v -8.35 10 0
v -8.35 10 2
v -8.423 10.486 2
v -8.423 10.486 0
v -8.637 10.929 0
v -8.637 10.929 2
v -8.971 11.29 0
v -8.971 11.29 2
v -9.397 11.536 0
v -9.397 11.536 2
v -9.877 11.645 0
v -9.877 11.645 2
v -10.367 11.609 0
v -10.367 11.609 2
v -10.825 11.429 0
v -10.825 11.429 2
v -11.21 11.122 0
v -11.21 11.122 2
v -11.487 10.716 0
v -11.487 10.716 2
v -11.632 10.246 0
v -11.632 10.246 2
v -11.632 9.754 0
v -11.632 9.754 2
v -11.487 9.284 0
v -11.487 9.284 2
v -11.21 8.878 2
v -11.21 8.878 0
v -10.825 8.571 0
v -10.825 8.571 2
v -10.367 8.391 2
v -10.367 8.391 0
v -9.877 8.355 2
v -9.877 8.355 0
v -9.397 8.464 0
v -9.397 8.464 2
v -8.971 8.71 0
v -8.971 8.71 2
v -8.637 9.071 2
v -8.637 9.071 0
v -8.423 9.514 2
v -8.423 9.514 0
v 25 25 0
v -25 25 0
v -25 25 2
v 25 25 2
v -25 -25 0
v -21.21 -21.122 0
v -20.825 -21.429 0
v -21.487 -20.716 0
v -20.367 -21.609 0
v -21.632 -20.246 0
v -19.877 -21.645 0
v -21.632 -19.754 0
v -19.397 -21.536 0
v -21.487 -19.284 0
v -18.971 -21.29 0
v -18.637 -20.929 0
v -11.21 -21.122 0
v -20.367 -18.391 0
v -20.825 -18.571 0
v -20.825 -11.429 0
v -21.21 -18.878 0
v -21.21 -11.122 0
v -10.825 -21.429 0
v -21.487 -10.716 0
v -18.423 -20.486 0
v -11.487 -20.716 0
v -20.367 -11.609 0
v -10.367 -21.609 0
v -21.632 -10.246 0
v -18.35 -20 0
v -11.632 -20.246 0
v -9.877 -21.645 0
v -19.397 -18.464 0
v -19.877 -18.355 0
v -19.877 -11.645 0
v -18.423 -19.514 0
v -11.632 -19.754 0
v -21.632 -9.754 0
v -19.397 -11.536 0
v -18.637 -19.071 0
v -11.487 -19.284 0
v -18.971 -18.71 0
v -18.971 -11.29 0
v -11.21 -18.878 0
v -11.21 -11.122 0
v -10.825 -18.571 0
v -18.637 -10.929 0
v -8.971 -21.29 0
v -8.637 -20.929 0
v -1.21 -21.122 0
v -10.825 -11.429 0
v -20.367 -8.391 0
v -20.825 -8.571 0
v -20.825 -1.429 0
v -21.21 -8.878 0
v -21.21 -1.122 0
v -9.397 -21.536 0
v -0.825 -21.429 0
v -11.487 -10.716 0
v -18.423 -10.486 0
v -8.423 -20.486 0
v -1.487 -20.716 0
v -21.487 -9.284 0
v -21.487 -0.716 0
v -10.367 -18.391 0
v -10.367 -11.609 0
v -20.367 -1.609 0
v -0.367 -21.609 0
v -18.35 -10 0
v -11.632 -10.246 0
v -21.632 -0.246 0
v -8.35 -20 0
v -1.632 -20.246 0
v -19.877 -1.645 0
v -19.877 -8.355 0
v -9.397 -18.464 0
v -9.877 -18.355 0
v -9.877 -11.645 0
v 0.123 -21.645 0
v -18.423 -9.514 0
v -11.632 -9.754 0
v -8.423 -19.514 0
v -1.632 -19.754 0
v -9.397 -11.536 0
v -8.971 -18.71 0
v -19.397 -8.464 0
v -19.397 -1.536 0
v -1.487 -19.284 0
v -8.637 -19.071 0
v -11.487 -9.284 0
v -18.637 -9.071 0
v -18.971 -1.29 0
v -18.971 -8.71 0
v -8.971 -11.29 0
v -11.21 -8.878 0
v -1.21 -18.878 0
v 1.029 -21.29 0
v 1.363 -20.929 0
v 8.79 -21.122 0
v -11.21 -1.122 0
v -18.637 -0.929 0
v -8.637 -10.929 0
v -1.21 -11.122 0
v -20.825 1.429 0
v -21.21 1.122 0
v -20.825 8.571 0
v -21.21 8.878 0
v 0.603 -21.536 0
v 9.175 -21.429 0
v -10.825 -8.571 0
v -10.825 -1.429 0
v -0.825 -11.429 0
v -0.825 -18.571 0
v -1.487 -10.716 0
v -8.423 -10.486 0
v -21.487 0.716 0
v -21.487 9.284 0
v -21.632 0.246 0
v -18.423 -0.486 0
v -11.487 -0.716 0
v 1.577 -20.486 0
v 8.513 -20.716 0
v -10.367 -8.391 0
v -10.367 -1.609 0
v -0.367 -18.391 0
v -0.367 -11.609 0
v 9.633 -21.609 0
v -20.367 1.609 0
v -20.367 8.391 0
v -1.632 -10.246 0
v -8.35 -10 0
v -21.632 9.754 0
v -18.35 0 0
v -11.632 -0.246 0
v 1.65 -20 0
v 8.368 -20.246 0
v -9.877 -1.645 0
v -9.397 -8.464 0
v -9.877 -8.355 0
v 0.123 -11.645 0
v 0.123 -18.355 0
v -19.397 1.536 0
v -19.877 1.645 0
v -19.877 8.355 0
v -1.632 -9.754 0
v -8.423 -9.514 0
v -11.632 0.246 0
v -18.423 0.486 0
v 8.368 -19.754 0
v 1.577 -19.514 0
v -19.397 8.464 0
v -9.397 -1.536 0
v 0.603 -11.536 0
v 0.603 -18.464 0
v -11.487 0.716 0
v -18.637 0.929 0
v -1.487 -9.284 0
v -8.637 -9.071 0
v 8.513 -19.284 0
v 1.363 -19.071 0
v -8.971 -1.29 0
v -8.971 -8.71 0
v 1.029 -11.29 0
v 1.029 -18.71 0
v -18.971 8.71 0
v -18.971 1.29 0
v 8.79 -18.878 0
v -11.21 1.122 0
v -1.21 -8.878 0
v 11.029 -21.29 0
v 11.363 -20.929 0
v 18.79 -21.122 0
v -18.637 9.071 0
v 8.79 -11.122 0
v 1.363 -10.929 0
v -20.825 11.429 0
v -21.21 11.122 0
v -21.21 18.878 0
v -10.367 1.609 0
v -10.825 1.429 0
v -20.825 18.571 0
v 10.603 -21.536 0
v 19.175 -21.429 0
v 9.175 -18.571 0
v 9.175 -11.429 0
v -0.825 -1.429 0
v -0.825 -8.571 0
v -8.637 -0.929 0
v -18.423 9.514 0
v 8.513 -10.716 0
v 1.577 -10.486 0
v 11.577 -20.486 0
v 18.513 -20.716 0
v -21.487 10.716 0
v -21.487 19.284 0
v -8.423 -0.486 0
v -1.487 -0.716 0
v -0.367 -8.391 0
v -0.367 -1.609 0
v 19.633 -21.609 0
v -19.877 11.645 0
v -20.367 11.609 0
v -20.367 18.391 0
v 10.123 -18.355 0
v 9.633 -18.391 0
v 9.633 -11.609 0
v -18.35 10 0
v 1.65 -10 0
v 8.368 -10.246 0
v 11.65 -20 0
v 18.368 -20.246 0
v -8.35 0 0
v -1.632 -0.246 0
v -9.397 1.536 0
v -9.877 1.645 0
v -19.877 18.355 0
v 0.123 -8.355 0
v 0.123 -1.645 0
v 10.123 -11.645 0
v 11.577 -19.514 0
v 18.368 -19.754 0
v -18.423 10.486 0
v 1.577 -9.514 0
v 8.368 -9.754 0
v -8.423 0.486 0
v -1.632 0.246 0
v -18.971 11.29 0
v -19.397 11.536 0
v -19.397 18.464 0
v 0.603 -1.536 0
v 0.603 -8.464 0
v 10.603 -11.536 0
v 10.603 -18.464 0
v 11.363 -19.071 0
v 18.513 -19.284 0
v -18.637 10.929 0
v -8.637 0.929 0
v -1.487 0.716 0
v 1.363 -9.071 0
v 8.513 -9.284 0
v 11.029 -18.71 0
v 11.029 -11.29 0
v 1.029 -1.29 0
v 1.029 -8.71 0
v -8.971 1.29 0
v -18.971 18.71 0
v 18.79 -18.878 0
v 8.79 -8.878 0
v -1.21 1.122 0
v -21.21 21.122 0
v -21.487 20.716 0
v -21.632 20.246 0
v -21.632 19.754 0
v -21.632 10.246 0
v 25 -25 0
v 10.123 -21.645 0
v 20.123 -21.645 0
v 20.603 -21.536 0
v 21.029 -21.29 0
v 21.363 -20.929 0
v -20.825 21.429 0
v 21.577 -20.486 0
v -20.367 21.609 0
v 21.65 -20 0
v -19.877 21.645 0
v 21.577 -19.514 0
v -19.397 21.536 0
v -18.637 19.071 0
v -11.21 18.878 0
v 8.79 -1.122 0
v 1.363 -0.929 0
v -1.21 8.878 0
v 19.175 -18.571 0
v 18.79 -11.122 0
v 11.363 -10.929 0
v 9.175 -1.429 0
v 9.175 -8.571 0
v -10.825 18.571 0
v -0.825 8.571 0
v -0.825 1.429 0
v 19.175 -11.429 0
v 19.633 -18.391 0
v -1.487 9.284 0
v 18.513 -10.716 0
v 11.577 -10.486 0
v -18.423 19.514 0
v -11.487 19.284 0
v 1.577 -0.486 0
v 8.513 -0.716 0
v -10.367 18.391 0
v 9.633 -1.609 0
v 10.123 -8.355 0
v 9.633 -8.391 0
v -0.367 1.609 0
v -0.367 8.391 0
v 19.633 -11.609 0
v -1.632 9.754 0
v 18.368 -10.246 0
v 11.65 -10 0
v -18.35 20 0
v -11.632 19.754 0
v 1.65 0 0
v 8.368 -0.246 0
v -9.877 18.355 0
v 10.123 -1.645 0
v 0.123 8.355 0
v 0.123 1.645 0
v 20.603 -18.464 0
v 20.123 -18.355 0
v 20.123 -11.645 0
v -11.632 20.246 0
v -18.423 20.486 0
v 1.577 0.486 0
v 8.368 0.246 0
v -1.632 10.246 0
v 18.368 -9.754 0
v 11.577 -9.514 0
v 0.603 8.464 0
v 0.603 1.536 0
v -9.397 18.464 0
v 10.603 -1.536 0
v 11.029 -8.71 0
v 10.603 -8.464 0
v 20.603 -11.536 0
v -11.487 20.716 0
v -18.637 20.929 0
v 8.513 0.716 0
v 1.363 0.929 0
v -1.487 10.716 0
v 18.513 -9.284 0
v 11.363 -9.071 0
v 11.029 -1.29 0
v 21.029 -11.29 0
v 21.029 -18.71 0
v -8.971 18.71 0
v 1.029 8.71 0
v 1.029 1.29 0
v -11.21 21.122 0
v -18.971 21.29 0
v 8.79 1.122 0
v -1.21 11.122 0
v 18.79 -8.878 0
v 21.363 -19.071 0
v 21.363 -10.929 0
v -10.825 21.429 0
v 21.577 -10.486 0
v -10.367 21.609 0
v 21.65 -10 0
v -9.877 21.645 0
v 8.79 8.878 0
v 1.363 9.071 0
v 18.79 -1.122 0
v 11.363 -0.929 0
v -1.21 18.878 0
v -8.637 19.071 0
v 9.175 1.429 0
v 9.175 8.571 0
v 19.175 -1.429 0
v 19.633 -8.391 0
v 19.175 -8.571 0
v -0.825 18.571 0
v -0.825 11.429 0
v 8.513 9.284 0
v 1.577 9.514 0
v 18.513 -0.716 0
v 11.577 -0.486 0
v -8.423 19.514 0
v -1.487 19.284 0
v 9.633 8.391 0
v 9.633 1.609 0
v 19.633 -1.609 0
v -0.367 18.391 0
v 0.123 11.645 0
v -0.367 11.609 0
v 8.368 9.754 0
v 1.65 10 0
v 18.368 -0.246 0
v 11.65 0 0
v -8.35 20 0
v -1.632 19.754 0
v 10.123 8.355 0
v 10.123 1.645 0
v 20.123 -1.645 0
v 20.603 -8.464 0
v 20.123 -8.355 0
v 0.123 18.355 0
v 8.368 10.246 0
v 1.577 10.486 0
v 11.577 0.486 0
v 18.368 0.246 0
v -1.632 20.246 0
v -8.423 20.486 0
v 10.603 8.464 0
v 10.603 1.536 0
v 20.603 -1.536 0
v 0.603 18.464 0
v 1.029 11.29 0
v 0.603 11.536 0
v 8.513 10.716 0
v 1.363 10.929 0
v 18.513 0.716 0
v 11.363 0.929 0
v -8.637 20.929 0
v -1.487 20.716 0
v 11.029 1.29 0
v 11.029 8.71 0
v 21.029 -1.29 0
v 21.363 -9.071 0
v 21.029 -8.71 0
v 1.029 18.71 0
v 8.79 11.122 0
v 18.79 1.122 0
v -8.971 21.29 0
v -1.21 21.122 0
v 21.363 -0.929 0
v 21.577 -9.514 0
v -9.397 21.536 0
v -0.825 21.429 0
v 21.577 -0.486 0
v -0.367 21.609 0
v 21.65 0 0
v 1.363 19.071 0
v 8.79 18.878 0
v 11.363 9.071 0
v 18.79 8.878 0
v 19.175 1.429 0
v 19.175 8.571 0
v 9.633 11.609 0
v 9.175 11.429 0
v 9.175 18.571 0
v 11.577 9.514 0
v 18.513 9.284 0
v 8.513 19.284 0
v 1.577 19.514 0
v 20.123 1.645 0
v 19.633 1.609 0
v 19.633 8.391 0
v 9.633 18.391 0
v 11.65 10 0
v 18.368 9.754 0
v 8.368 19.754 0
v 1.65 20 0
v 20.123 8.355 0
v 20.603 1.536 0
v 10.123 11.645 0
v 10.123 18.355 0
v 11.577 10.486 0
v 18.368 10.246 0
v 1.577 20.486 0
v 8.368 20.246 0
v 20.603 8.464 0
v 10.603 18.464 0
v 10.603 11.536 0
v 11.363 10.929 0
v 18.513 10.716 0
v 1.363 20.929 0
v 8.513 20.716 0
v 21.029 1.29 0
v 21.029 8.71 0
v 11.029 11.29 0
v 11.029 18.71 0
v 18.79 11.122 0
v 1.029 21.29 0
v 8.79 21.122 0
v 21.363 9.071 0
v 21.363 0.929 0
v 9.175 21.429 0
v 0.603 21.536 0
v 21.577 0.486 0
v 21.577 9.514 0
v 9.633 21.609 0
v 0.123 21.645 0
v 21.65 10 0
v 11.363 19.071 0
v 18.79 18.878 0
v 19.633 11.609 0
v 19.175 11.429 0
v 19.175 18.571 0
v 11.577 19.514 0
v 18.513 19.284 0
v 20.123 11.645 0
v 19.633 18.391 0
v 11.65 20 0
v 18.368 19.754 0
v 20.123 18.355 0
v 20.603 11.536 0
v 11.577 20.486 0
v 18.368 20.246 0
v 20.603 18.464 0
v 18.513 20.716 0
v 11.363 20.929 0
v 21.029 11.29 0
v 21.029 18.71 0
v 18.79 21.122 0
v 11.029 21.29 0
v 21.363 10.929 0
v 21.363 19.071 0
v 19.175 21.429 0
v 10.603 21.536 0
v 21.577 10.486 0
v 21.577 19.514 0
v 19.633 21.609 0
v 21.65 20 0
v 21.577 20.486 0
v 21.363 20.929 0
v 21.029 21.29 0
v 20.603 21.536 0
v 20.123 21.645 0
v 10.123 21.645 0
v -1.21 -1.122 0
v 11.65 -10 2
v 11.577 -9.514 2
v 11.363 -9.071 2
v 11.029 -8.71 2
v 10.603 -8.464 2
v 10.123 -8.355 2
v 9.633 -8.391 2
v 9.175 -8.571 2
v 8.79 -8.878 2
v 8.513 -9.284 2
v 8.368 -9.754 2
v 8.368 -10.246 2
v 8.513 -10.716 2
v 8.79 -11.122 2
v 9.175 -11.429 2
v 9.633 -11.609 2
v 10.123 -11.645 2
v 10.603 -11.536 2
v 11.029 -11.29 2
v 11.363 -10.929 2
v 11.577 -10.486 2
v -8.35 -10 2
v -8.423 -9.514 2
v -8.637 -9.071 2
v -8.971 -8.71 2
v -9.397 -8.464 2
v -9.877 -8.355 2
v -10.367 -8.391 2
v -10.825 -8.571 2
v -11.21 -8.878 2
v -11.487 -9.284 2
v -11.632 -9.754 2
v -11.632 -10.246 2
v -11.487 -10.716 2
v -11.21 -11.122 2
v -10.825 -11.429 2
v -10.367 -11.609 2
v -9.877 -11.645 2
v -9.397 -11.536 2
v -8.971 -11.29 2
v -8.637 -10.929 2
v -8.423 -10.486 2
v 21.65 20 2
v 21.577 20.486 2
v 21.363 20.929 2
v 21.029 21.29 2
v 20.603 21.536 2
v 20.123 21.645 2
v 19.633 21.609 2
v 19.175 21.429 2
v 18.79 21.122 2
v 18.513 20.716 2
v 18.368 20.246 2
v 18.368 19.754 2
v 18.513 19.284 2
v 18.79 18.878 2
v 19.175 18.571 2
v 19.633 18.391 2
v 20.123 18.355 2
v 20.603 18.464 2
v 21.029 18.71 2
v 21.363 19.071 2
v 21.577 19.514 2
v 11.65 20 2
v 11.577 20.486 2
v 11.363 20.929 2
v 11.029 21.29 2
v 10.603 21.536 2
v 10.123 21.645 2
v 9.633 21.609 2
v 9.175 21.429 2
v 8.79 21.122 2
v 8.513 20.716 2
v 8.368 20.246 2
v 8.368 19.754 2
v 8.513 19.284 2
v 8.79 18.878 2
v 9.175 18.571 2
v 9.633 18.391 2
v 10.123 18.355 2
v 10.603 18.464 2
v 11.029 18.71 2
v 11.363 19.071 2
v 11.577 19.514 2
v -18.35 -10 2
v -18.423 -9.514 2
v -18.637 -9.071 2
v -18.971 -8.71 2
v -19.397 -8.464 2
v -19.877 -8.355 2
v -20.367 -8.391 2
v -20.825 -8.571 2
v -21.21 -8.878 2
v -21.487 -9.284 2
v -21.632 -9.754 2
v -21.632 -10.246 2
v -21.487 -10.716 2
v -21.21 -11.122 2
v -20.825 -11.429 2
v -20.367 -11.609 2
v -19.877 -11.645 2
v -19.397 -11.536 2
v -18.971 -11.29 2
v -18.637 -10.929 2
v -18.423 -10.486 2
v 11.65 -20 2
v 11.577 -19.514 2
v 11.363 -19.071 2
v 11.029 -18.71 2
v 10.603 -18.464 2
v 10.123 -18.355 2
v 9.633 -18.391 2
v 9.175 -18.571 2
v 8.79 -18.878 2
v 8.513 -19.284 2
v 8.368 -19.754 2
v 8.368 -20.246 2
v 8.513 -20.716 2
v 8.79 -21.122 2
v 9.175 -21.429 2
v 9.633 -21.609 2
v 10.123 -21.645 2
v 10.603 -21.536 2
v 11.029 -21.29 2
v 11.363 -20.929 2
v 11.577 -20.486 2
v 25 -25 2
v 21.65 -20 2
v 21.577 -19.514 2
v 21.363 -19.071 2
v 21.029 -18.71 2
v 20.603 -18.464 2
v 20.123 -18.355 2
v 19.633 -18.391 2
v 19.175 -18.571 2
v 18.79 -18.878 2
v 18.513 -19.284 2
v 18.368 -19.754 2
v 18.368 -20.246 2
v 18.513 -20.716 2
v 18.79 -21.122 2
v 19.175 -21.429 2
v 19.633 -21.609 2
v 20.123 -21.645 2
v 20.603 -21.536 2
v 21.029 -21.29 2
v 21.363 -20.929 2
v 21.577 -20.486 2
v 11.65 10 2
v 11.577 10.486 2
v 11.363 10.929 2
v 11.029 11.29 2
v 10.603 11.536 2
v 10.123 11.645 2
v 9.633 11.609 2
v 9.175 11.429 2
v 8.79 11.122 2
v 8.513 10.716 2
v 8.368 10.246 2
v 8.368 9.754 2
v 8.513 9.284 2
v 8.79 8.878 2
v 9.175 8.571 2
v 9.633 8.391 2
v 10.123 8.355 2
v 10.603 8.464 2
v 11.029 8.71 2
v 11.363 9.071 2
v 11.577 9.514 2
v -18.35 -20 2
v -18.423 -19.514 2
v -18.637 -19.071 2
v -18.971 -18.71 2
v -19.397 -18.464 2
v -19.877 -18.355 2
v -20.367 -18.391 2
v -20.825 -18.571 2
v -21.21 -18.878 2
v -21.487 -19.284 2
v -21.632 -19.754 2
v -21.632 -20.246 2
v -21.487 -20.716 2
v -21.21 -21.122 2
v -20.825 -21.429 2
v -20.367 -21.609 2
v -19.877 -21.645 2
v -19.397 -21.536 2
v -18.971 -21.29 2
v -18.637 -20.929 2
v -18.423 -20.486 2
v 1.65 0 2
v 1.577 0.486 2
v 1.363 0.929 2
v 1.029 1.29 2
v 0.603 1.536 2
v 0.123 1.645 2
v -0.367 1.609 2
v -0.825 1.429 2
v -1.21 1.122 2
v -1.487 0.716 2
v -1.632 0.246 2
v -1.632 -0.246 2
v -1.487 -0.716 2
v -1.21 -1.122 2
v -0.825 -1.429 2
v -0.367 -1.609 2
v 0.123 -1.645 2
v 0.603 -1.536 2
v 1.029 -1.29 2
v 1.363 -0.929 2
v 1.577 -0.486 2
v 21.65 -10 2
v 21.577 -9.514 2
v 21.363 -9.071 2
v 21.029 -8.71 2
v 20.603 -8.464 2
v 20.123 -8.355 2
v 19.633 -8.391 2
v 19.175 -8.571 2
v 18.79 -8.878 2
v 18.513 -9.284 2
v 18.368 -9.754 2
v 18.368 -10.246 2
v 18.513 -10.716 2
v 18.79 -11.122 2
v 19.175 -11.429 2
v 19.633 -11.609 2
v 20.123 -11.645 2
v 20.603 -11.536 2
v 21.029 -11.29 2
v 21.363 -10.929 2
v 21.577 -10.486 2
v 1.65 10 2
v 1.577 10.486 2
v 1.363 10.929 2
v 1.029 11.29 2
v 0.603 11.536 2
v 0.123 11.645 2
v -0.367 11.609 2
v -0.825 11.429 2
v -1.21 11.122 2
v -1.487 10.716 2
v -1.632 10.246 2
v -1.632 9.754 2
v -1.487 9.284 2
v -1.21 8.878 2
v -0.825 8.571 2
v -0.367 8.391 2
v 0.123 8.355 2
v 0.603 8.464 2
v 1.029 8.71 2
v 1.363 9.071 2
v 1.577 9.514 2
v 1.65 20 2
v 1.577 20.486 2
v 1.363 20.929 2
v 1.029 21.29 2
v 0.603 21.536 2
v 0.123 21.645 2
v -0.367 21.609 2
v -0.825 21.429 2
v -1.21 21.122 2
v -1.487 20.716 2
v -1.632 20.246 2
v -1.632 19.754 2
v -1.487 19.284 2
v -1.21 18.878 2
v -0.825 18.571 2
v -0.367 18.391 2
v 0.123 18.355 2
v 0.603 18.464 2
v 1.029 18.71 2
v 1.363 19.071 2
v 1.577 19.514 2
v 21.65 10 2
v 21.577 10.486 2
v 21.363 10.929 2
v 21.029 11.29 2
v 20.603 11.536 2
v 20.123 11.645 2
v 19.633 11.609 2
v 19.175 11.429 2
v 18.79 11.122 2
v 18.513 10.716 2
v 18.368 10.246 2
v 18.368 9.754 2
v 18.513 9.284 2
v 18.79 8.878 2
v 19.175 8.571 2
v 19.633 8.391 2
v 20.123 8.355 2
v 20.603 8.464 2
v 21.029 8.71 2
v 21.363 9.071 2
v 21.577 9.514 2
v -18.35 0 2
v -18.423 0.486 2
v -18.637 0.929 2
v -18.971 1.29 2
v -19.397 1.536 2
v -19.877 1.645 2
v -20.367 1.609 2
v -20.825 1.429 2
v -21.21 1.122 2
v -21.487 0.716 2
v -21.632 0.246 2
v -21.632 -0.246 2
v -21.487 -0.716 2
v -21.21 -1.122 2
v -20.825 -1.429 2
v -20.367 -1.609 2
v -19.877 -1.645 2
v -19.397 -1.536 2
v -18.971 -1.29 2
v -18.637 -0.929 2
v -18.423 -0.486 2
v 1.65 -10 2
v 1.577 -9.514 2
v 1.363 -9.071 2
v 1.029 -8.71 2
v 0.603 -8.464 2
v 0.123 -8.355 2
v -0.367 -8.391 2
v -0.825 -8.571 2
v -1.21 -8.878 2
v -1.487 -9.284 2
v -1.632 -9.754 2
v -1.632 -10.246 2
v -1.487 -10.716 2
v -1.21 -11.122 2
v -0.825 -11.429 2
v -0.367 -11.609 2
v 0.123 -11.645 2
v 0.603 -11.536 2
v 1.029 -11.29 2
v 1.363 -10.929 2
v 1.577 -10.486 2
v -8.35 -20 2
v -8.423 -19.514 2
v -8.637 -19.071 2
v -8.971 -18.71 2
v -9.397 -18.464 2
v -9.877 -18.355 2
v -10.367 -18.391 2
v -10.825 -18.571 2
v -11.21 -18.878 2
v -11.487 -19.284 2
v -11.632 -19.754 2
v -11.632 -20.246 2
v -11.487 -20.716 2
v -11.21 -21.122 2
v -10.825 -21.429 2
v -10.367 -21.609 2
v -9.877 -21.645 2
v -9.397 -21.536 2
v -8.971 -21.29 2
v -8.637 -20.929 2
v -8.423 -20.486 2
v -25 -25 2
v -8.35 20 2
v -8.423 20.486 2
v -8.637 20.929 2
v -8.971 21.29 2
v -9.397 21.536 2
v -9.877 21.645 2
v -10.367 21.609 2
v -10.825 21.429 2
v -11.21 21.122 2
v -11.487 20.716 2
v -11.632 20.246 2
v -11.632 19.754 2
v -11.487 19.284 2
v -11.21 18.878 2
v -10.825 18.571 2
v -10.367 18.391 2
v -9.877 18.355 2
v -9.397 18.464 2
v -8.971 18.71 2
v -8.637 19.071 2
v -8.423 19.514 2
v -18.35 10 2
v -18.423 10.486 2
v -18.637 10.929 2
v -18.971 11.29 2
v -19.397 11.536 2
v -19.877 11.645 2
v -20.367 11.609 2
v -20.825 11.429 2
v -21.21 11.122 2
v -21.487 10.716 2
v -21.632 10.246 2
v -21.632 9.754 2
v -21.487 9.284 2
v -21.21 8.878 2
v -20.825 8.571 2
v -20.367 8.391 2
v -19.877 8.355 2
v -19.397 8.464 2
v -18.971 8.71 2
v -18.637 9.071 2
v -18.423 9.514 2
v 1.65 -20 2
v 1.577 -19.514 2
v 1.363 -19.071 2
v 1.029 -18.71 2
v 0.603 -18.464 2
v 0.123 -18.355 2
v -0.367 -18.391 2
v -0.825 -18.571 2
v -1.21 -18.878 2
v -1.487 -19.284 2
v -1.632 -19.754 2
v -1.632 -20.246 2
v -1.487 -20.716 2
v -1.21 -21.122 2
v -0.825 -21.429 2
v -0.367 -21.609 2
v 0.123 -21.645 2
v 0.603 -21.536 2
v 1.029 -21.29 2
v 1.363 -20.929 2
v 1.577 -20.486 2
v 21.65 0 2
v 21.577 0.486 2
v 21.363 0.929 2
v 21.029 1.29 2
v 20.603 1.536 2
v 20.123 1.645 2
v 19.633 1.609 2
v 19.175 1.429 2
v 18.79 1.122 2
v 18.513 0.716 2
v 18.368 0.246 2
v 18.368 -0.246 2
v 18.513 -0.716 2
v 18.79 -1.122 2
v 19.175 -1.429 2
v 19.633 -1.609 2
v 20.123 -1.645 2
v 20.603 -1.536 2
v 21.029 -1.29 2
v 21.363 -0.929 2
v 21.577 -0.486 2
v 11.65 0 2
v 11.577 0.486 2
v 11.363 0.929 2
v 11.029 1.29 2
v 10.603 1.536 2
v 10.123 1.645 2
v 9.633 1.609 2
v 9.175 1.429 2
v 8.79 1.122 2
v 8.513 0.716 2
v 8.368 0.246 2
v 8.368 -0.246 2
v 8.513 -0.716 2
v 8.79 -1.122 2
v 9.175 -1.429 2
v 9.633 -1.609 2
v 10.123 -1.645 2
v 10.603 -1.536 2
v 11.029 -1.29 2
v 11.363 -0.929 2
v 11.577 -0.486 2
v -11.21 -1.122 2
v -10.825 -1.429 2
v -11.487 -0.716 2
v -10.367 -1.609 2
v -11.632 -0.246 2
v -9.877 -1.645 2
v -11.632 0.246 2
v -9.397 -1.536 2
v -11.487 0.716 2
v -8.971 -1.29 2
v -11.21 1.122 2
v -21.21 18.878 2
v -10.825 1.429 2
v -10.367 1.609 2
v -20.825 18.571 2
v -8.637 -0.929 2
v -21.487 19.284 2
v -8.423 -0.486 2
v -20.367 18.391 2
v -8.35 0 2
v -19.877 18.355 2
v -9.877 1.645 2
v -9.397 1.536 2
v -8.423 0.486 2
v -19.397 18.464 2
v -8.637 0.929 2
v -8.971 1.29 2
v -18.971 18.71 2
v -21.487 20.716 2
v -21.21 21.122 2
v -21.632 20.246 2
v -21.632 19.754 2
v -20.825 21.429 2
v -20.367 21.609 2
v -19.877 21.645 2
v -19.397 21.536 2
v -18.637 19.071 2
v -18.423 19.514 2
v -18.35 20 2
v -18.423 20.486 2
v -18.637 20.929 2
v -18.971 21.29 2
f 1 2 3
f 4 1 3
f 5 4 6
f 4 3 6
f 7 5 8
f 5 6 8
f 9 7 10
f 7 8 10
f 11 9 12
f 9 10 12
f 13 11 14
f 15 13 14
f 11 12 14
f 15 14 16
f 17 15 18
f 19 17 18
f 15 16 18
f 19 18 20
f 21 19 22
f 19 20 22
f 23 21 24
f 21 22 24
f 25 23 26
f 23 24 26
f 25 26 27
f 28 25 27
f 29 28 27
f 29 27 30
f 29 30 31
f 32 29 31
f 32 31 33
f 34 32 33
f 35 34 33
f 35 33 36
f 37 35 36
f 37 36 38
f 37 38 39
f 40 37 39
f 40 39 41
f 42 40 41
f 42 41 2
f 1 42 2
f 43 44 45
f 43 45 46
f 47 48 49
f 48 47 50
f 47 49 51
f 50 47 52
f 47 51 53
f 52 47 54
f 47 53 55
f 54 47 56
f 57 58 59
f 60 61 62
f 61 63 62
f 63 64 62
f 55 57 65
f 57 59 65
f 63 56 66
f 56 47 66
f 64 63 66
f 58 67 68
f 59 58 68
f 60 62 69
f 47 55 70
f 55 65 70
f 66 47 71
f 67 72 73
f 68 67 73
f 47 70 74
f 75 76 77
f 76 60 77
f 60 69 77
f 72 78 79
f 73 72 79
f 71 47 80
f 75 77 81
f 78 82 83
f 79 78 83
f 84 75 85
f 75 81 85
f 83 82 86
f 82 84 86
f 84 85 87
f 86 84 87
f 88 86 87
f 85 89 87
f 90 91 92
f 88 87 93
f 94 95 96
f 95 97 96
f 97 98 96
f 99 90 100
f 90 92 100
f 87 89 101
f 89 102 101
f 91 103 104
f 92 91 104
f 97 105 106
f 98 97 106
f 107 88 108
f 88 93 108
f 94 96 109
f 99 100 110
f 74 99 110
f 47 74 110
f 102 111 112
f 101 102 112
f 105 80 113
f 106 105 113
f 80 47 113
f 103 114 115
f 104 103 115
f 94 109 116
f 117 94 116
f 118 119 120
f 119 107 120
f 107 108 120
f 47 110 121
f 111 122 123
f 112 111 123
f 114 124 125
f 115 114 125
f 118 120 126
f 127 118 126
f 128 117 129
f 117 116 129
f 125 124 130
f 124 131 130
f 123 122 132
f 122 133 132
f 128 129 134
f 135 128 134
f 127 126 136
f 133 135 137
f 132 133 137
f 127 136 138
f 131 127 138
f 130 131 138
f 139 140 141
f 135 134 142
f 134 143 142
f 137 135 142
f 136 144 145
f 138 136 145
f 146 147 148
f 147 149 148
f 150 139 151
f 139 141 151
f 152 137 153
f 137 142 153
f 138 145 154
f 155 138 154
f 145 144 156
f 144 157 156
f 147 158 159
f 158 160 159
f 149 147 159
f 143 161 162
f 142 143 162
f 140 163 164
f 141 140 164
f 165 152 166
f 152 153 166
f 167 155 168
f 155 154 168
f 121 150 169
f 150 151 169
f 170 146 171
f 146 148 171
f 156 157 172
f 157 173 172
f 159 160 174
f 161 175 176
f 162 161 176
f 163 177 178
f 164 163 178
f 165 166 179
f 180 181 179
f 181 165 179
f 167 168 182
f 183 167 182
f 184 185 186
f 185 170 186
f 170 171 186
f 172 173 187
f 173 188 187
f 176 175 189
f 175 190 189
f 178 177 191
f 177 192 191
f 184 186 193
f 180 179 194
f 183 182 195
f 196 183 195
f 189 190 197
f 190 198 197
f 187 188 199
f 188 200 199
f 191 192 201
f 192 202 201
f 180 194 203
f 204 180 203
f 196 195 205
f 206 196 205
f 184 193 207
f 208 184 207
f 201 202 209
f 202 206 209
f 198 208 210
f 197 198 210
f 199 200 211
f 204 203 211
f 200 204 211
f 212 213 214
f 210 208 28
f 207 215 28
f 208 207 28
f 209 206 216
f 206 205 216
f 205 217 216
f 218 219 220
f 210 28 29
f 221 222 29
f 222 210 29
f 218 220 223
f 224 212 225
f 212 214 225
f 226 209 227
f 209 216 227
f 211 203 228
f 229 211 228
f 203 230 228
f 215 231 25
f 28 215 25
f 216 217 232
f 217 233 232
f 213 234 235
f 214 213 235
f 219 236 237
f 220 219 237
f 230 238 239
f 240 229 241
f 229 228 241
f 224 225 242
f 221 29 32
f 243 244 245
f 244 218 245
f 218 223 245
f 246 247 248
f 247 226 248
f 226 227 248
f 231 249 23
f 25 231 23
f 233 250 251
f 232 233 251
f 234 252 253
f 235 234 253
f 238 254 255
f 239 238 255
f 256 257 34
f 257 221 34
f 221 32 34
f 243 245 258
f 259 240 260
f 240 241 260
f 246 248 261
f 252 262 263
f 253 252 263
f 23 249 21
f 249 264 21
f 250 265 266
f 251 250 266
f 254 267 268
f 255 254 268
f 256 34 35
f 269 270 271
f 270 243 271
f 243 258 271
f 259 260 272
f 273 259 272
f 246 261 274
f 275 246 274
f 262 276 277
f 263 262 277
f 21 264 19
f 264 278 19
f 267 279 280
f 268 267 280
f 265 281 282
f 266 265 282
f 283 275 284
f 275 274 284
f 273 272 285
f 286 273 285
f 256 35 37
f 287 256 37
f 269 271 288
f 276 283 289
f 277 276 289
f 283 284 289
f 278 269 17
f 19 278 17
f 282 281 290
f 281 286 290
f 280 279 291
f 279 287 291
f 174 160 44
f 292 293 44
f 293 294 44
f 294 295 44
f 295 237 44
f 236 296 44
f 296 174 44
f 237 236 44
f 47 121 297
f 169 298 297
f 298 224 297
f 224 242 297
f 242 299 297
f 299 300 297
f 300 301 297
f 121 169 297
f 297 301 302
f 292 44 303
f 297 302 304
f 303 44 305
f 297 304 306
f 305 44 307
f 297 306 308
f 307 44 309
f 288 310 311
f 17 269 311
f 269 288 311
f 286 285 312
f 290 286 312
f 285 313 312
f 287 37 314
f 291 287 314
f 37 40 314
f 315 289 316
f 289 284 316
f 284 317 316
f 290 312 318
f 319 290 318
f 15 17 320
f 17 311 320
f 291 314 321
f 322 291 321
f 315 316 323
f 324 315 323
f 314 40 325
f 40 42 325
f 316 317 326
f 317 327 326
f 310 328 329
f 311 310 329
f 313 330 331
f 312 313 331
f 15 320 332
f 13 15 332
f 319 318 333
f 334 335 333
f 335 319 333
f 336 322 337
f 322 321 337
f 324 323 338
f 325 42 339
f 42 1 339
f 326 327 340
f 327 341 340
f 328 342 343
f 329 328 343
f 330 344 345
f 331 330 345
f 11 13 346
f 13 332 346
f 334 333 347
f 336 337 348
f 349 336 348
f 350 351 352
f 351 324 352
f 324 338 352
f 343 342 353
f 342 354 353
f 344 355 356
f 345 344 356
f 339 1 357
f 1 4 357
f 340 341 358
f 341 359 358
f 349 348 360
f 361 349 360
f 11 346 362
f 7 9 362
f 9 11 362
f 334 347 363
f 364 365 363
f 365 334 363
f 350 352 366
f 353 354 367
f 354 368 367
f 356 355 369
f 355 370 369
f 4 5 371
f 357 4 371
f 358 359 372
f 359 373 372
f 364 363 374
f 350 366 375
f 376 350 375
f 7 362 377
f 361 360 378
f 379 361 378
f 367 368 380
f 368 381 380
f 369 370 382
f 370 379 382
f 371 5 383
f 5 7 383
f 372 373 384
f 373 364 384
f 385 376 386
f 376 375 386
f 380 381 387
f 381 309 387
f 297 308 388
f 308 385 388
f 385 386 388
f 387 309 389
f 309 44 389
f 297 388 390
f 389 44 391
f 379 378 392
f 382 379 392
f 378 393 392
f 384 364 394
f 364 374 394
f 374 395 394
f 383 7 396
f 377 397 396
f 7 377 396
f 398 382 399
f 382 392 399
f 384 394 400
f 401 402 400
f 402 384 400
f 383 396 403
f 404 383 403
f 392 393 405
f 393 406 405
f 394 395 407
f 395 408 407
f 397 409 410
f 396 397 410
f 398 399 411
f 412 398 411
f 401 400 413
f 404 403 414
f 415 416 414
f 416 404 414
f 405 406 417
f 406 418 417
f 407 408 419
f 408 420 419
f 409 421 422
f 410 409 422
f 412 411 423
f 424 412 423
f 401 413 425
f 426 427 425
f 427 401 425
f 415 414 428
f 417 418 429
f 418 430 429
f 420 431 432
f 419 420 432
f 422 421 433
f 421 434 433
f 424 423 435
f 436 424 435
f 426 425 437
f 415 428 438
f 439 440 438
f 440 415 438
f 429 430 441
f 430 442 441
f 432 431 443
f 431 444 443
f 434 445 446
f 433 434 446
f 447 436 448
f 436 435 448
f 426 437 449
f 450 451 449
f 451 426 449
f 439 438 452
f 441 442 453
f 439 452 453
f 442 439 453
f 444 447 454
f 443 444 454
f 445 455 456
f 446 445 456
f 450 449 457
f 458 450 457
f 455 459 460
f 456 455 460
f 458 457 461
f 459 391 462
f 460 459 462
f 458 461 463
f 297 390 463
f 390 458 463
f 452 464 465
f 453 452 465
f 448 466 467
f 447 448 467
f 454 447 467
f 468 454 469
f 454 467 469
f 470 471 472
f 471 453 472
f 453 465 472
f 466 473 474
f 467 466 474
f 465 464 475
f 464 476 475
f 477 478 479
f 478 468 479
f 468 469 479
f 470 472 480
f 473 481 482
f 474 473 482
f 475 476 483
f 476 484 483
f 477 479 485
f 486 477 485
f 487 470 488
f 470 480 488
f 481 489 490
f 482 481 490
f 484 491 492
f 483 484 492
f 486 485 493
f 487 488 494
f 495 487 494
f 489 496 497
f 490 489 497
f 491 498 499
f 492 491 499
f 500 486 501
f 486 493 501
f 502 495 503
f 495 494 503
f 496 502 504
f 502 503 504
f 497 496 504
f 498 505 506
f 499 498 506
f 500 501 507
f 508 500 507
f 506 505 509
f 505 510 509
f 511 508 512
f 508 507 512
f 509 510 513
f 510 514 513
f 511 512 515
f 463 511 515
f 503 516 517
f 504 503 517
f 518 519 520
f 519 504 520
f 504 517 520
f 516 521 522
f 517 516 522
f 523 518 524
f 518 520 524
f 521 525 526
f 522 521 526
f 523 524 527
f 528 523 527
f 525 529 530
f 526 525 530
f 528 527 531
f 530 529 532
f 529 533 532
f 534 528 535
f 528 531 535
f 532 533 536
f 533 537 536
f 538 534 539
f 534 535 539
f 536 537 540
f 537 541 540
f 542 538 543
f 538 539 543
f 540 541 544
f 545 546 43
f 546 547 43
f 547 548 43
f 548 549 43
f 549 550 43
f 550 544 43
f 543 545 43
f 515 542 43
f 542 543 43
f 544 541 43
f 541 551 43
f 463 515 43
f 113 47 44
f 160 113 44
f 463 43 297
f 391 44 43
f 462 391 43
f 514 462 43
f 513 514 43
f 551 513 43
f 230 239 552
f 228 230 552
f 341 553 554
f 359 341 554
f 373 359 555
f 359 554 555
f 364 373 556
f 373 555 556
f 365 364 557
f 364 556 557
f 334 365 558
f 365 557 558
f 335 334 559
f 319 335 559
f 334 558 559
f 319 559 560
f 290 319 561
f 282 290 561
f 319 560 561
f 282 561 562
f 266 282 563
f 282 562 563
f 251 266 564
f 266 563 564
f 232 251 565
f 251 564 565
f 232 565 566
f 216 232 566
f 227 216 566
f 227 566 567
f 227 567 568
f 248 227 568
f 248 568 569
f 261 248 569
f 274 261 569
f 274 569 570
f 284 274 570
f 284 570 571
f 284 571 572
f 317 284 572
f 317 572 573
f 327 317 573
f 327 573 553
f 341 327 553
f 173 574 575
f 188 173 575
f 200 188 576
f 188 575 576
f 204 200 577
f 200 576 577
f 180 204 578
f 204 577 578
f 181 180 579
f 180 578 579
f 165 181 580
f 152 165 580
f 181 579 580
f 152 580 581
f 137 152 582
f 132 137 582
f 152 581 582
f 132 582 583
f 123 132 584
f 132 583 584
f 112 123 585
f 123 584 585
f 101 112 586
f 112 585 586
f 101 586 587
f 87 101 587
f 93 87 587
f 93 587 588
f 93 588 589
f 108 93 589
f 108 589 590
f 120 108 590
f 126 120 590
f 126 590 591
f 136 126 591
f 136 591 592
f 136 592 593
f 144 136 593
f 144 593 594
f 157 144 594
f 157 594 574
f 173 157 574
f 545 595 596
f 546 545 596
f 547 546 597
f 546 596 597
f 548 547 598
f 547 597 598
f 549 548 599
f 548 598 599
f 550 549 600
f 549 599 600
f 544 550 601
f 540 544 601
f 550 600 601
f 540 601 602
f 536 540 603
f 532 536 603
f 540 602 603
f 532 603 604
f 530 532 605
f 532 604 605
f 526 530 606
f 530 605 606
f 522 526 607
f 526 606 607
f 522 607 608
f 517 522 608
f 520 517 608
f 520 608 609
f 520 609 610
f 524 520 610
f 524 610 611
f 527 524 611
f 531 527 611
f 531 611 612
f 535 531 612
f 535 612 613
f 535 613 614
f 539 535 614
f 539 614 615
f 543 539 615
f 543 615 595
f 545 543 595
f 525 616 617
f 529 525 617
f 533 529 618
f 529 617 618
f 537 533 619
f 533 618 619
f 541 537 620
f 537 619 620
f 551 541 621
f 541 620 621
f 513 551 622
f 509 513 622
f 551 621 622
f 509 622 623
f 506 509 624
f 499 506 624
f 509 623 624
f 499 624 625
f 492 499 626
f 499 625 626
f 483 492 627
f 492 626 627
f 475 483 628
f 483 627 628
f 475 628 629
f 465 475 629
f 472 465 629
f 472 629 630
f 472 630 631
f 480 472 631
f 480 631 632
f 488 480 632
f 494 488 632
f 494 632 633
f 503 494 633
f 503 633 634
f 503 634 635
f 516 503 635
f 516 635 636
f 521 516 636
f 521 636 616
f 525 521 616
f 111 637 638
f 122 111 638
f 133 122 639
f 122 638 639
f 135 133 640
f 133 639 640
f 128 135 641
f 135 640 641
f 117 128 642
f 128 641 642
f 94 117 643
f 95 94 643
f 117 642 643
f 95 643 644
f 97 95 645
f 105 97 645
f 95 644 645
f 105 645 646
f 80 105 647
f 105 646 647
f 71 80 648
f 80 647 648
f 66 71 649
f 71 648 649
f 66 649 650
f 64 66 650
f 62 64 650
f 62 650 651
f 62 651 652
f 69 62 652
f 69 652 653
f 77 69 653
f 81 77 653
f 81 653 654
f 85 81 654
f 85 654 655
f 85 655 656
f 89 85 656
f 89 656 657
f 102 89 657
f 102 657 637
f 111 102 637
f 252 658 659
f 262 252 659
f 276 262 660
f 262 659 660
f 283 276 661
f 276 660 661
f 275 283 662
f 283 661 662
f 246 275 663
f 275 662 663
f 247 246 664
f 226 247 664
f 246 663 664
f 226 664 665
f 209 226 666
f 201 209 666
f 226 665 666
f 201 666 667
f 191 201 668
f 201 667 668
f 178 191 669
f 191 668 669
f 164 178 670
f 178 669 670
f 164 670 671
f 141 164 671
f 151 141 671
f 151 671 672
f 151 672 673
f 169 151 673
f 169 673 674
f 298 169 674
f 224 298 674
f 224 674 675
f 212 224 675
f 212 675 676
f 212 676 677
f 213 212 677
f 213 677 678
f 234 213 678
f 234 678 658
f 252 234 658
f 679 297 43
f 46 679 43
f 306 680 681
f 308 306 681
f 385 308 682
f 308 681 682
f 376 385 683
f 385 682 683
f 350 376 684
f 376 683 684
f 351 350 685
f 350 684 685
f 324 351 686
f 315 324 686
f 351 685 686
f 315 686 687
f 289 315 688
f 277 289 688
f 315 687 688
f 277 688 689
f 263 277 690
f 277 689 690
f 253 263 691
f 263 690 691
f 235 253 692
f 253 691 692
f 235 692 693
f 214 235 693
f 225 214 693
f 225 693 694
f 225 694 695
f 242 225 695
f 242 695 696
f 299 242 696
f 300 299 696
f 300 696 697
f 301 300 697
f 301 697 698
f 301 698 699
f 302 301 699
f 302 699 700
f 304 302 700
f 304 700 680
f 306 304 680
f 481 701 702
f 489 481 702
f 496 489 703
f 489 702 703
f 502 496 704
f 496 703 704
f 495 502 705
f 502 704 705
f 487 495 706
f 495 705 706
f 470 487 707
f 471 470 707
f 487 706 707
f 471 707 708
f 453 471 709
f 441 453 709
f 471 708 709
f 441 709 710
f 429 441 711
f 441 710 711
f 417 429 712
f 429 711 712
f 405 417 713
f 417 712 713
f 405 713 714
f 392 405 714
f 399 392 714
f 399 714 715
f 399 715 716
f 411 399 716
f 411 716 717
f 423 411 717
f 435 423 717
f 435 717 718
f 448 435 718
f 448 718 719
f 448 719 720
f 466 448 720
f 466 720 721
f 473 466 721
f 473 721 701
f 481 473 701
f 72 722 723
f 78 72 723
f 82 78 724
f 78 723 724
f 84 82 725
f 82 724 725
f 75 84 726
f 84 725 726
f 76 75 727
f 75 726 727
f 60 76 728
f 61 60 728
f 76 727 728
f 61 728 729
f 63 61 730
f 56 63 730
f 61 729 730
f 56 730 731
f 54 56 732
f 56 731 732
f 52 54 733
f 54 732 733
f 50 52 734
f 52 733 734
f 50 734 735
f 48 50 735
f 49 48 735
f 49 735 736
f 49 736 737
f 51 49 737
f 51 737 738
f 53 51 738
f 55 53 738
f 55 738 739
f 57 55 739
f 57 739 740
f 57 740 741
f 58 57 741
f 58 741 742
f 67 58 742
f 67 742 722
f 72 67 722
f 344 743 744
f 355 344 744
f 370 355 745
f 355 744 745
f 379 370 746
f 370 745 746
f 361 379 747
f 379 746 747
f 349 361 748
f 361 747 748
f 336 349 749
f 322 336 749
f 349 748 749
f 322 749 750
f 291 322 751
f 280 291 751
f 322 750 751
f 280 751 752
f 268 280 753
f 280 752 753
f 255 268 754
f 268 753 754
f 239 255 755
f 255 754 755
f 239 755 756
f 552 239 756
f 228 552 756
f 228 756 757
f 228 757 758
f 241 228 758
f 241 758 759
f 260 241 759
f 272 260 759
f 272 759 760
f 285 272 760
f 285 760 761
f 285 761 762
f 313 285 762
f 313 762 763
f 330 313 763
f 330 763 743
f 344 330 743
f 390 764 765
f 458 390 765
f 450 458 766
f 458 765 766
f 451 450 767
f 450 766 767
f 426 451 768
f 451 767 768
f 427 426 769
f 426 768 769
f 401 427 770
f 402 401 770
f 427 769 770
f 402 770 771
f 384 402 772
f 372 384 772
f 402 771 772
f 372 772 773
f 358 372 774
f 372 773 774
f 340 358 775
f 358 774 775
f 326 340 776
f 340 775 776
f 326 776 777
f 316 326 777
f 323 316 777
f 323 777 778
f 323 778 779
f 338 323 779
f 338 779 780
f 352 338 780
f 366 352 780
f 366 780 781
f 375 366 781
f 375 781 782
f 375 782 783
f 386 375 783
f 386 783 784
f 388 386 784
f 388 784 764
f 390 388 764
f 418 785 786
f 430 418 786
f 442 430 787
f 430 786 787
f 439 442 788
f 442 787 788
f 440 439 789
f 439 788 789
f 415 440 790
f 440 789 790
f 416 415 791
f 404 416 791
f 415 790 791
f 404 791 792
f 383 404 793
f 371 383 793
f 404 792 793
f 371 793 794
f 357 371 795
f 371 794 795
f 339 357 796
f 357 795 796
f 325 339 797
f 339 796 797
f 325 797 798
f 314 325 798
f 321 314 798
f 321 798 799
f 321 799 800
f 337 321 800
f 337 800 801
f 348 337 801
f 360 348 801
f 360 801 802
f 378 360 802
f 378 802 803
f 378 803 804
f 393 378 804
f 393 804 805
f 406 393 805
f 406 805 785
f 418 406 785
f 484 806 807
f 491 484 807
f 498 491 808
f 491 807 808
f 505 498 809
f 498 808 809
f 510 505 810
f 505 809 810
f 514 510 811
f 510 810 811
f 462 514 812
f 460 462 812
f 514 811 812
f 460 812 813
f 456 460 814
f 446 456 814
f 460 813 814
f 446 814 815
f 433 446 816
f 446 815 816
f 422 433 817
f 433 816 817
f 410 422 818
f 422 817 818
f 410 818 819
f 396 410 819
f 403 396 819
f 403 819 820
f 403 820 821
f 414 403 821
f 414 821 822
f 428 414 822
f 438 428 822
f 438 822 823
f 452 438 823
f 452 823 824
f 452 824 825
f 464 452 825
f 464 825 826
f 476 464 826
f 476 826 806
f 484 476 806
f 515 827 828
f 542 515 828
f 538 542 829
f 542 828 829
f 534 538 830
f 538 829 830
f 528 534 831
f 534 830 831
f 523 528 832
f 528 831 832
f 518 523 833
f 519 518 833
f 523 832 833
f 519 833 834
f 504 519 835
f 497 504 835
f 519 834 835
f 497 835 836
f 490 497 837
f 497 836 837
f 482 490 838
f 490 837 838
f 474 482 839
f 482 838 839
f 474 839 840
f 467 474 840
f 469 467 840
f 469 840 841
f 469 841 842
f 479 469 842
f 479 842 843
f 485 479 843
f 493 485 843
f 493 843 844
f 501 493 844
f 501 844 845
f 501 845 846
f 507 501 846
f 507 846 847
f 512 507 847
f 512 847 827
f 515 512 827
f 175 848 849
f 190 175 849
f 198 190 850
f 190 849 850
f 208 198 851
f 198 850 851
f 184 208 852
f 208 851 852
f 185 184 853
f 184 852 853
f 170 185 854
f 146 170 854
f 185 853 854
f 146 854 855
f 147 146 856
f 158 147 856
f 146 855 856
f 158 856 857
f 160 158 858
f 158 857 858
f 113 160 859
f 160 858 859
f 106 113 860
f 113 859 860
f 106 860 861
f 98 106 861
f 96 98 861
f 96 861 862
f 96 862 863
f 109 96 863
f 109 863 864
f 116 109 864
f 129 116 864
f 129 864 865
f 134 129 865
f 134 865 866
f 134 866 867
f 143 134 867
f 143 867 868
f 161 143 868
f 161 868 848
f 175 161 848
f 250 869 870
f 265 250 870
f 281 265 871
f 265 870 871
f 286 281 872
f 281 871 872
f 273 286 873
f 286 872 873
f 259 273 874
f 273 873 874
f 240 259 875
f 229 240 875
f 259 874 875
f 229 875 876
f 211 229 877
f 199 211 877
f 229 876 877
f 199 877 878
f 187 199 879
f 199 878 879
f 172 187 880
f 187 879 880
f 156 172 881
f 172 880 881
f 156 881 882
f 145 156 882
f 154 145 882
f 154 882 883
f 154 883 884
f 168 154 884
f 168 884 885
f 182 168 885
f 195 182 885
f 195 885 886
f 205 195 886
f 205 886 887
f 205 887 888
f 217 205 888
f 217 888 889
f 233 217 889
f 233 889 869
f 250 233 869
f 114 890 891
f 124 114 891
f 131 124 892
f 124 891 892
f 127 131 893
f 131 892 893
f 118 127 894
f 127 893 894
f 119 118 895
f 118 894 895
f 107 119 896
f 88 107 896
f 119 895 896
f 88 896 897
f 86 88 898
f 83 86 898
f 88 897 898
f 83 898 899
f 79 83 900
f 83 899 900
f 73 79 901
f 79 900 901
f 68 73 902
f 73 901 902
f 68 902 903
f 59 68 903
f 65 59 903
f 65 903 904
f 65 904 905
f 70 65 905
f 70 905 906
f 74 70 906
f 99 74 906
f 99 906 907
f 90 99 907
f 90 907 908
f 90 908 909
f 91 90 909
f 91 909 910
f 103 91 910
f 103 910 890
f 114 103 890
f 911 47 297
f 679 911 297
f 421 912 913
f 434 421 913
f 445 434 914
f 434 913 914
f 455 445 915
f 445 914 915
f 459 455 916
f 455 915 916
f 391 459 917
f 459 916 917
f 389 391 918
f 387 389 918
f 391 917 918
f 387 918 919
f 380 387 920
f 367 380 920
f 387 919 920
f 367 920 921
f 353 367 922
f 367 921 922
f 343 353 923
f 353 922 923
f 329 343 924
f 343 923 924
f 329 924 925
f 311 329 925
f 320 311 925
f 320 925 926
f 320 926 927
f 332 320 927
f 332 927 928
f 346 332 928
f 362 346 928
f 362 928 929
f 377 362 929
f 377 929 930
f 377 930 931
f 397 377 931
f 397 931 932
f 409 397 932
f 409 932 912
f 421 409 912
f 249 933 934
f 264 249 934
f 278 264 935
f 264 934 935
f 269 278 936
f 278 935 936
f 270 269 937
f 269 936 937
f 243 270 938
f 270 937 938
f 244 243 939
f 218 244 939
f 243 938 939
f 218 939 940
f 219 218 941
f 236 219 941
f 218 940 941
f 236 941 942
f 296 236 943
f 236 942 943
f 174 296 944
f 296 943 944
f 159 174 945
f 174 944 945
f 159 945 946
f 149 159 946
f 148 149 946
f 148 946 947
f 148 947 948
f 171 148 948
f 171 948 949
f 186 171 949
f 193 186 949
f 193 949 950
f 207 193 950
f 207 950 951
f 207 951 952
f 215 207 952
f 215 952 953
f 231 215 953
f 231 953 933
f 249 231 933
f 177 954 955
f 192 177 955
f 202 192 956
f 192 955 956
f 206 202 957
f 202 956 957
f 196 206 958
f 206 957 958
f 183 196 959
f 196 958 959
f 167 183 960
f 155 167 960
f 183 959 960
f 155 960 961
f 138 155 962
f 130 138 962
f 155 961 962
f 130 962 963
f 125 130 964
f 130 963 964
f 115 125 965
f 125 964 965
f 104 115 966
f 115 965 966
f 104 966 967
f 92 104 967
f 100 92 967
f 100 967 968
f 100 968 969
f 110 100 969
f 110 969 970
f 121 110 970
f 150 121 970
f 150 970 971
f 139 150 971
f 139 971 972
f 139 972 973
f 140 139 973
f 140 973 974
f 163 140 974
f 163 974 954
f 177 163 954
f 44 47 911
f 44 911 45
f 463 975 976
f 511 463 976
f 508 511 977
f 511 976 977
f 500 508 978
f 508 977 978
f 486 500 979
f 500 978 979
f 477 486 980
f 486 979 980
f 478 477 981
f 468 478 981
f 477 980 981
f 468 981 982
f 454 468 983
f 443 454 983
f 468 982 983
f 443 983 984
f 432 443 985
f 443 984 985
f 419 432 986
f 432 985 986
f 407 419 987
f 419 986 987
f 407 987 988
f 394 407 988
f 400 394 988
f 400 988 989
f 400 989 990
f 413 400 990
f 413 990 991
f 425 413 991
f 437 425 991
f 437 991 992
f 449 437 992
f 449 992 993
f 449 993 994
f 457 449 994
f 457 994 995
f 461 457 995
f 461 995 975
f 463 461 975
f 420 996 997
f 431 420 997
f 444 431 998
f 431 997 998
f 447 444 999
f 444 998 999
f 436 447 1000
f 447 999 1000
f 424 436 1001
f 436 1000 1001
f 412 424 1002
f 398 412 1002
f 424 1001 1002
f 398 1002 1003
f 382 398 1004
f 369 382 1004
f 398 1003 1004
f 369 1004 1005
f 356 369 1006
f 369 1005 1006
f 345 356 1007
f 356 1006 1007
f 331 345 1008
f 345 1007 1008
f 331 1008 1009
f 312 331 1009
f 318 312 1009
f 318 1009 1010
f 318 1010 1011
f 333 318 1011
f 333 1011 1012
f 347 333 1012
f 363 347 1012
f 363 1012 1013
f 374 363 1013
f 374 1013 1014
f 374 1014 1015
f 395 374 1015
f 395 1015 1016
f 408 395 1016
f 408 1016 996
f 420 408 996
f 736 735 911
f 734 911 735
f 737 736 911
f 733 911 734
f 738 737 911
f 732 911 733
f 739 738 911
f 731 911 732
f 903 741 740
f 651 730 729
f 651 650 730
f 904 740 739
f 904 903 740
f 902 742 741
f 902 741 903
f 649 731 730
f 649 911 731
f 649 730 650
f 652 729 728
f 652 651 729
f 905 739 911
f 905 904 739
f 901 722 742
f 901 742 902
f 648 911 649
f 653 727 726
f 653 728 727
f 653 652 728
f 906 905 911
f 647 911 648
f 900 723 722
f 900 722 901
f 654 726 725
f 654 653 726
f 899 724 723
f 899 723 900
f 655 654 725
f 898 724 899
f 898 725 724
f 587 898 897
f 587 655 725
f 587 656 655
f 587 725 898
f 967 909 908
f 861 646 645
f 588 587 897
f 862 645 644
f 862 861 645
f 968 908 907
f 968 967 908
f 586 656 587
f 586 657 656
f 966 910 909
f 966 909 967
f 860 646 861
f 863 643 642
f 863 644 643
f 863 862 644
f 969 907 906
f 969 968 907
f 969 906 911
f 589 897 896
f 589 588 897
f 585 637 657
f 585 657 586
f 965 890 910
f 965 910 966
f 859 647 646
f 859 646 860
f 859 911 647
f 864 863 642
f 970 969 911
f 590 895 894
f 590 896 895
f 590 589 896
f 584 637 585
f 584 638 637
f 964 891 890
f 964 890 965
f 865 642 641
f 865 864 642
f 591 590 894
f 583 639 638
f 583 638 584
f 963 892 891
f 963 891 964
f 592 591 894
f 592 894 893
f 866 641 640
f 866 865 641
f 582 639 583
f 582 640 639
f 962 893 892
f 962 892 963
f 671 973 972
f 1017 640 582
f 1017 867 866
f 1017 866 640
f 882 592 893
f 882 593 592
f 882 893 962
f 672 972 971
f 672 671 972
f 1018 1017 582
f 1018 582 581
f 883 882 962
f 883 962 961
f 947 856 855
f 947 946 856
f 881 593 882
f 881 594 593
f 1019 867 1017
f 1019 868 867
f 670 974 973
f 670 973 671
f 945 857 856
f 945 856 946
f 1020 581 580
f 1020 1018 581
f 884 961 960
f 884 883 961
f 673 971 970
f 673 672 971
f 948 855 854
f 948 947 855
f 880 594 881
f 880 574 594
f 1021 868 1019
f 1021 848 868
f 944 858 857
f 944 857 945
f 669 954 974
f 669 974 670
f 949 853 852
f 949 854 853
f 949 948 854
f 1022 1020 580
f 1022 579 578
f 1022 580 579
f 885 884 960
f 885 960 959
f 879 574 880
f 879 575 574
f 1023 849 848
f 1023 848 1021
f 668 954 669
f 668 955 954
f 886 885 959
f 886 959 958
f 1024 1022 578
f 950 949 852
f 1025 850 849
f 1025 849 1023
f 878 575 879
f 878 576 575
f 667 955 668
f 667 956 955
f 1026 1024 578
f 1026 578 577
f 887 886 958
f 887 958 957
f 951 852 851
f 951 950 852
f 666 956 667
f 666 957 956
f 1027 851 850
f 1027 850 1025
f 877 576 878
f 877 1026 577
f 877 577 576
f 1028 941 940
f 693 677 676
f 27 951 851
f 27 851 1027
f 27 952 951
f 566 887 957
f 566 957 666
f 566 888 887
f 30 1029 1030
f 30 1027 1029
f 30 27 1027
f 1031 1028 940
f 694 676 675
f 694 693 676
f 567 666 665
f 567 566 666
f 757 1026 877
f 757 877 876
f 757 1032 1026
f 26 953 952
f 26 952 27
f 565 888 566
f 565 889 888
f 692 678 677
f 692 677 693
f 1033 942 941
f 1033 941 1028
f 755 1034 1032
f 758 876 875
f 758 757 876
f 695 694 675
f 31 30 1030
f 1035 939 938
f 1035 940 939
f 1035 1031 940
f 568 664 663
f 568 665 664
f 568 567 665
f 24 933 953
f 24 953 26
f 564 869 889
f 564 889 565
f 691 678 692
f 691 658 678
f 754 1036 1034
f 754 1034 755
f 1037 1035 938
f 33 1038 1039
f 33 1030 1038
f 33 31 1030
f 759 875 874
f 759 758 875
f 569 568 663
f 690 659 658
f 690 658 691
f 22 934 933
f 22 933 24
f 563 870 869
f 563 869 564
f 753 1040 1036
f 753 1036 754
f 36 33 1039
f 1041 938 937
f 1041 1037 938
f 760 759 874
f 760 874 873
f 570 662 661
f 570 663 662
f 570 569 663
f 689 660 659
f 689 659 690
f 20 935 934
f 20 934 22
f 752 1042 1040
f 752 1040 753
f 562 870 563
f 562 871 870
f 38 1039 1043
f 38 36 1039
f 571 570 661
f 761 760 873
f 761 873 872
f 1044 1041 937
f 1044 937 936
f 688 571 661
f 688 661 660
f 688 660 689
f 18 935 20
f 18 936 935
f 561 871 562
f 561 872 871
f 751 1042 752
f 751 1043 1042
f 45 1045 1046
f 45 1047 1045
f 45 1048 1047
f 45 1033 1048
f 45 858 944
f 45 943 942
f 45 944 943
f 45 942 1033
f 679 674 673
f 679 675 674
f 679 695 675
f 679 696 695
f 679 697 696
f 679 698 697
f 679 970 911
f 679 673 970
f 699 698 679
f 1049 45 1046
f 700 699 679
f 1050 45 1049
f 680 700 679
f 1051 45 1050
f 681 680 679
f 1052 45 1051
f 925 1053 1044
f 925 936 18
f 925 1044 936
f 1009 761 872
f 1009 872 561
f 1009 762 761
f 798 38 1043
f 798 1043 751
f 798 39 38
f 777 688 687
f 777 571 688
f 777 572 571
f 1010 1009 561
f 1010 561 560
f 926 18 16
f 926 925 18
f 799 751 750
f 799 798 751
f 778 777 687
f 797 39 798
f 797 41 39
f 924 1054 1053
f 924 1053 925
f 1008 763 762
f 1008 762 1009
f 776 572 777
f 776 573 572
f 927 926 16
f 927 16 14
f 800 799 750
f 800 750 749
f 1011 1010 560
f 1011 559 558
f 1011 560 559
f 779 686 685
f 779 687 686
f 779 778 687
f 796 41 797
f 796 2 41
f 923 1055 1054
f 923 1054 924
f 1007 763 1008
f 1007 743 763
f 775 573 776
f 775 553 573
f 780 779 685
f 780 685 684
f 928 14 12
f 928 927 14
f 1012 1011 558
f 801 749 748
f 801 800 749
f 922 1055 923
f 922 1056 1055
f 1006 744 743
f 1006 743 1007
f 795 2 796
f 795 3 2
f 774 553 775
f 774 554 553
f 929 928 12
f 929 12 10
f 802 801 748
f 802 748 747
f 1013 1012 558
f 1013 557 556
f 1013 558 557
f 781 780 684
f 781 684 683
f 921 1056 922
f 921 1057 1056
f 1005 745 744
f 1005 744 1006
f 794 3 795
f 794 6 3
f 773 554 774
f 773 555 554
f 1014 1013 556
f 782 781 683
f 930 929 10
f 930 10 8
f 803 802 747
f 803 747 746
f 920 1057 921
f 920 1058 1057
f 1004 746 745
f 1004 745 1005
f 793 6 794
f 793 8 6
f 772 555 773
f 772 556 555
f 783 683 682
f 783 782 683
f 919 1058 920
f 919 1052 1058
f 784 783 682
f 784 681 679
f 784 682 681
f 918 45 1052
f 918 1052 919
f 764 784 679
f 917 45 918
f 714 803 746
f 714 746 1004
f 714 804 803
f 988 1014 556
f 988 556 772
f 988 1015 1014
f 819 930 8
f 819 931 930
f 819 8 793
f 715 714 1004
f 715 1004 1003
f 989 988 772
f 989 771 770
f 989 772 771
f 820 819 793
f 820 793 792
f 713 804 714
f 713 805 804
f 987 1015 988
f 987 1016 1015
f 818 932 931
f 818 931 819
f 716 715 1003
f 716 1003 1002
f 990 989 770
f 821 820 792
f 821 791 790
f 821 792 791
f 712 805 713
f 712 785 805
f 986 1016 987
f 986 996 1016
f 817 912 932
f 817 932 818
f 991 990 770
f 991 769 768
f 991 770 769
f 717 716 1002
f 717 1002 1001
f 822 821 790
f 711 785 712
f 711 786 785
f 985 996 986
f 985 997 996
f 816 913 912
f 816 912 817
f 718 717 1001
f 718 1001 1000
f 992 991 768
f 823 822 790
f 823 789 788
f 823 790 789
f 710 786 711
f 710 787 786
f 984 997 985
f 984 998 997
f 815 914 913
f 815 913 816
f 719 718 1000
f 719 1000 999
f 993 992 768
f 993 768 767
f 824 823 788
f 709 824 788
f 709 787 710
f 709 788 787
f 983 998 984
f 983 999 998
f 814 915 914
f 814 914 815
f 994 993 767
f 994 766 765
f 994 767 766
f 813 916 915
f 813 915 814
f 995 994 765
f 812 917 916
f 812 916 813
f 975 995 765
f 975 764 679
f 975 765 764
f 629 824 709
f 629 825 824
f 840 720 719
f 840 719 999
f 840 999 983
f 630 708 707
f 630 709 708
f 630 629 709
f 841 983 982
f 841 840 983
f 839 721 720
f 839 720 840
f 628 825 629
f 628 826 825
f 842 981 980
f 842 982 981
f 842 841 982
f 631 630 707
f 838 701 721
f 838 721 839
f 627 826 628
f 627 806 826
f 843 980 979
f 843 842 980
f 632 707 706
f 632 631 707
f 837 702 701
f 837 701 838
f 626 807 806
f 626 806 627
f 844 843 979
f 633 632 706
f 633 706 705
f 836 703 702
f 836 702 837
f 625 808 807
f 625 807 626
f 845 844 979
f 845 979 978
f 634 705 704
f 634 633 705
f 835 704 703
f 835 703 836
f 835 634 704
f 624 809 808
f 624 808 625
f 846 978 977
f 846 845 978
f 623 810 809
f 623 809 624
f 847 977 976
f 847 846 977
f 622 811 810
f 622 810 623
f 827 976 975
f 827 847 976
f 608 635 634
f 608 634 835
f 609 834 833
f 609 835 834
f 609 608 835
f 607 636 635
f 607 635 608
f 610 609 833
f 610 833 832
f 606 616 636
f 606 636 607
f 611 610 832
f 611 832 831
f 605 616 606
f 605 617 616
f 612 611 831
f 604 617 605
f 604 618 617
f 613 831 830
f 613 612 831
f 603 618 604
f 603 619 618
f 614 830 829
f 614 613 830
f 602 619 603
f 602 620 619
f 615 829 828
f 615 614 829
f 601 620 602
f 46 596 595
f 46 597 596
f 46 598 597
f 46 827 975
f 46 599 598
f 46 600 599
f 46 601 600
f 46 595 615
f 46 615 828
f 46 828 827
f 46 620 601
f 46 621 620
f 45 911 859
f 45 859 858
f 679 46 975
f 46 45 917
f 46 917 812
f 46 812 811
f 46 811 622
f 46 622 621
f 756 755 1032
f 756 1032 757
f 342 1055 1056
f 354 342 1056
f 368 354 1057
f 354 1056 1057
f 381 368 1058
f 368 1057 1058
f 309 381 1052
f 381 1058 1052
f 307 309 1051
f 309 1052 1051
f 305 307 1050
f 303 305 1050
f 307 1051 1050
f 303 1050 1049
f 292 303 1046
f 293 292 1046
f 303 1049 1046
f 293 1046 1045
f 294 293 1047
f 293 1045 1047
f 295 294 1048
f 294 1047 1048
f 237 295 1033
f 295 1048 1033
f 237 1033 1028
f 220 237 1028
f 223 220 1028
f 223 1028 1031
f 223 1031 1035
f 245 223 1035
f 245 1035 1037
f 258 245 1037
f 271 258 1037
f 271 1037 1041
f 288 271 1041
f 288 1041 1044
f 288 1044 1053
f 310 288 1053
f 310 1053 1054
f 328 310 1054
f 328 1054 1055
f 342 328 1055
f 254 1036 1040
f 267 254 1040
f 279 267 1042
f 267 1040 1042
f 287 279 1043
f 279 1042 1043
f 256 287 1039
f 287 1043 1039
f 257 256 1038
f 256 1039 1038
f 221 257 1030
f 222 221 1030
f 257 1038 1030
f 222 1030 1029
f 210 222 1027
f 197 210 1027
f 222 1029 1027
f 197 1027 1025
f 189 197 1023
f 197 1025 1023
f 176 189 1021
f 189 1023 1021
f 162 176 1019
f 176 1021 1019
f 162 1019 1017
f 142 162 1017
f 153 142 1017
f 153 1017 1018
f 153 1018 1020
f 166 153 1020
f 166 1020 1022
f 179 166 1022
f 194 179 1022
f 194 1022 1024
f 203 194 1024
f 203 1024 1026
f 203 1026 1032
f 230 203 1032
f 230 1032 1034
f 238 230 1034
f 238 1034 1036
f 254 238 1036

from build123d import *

# Parameters (mm, degrees)
SKETCH1_W            = 50
SKETCH1_H            = 50
BOSS_EXTRUDE1_DEPTH  = 2
SKETCH2_R            = 1.65
CUT_EXTRUDE1_DEPTH   = 3
LPATTERN1_COUNT      = 5
LPATTERN1_PITCH      = 10
LPATTERN1_COUNT_DIR2 = 5
LPATTERN1_PITCH_DIR2 = 10


with BuildPart() as part:
    # Sketch1 → Boss-Extrude1 (new body)
    with BuildSketch(Plane.XY):
        Rectangle(SKETCH1_W, SKETCH1_H)
    extrude(amount=BOSS_EXTRUDE1_DEPTH)

    # Sketch2 → Cut-Extrude1 (cut, through all)
    with BuildSketch(Plane.XY.offset(2)):
        with Locations((-20, 20)):
            Circle(SKETCH2_R)
    cut_extrude1 = extrude(amount=-CUT_EXTRUDE1_DEPTH, mode=Mode.SUBTRACT)

    # LPattern1: Cut-Extrude1 5 × 5
    with Locations(*[(j * LPATTERN1_PITCH_DIR2, -i * LPATTERN1_PITCH, 0) for i in range(LPATTERN1_COUNT) for j in range(LPATTERN1_COUNT_DIR2) if (i, j) != (0, 0)]):
        add(cut_extrude1, mode=Mode.SUBTRACT)


solid = part.part
